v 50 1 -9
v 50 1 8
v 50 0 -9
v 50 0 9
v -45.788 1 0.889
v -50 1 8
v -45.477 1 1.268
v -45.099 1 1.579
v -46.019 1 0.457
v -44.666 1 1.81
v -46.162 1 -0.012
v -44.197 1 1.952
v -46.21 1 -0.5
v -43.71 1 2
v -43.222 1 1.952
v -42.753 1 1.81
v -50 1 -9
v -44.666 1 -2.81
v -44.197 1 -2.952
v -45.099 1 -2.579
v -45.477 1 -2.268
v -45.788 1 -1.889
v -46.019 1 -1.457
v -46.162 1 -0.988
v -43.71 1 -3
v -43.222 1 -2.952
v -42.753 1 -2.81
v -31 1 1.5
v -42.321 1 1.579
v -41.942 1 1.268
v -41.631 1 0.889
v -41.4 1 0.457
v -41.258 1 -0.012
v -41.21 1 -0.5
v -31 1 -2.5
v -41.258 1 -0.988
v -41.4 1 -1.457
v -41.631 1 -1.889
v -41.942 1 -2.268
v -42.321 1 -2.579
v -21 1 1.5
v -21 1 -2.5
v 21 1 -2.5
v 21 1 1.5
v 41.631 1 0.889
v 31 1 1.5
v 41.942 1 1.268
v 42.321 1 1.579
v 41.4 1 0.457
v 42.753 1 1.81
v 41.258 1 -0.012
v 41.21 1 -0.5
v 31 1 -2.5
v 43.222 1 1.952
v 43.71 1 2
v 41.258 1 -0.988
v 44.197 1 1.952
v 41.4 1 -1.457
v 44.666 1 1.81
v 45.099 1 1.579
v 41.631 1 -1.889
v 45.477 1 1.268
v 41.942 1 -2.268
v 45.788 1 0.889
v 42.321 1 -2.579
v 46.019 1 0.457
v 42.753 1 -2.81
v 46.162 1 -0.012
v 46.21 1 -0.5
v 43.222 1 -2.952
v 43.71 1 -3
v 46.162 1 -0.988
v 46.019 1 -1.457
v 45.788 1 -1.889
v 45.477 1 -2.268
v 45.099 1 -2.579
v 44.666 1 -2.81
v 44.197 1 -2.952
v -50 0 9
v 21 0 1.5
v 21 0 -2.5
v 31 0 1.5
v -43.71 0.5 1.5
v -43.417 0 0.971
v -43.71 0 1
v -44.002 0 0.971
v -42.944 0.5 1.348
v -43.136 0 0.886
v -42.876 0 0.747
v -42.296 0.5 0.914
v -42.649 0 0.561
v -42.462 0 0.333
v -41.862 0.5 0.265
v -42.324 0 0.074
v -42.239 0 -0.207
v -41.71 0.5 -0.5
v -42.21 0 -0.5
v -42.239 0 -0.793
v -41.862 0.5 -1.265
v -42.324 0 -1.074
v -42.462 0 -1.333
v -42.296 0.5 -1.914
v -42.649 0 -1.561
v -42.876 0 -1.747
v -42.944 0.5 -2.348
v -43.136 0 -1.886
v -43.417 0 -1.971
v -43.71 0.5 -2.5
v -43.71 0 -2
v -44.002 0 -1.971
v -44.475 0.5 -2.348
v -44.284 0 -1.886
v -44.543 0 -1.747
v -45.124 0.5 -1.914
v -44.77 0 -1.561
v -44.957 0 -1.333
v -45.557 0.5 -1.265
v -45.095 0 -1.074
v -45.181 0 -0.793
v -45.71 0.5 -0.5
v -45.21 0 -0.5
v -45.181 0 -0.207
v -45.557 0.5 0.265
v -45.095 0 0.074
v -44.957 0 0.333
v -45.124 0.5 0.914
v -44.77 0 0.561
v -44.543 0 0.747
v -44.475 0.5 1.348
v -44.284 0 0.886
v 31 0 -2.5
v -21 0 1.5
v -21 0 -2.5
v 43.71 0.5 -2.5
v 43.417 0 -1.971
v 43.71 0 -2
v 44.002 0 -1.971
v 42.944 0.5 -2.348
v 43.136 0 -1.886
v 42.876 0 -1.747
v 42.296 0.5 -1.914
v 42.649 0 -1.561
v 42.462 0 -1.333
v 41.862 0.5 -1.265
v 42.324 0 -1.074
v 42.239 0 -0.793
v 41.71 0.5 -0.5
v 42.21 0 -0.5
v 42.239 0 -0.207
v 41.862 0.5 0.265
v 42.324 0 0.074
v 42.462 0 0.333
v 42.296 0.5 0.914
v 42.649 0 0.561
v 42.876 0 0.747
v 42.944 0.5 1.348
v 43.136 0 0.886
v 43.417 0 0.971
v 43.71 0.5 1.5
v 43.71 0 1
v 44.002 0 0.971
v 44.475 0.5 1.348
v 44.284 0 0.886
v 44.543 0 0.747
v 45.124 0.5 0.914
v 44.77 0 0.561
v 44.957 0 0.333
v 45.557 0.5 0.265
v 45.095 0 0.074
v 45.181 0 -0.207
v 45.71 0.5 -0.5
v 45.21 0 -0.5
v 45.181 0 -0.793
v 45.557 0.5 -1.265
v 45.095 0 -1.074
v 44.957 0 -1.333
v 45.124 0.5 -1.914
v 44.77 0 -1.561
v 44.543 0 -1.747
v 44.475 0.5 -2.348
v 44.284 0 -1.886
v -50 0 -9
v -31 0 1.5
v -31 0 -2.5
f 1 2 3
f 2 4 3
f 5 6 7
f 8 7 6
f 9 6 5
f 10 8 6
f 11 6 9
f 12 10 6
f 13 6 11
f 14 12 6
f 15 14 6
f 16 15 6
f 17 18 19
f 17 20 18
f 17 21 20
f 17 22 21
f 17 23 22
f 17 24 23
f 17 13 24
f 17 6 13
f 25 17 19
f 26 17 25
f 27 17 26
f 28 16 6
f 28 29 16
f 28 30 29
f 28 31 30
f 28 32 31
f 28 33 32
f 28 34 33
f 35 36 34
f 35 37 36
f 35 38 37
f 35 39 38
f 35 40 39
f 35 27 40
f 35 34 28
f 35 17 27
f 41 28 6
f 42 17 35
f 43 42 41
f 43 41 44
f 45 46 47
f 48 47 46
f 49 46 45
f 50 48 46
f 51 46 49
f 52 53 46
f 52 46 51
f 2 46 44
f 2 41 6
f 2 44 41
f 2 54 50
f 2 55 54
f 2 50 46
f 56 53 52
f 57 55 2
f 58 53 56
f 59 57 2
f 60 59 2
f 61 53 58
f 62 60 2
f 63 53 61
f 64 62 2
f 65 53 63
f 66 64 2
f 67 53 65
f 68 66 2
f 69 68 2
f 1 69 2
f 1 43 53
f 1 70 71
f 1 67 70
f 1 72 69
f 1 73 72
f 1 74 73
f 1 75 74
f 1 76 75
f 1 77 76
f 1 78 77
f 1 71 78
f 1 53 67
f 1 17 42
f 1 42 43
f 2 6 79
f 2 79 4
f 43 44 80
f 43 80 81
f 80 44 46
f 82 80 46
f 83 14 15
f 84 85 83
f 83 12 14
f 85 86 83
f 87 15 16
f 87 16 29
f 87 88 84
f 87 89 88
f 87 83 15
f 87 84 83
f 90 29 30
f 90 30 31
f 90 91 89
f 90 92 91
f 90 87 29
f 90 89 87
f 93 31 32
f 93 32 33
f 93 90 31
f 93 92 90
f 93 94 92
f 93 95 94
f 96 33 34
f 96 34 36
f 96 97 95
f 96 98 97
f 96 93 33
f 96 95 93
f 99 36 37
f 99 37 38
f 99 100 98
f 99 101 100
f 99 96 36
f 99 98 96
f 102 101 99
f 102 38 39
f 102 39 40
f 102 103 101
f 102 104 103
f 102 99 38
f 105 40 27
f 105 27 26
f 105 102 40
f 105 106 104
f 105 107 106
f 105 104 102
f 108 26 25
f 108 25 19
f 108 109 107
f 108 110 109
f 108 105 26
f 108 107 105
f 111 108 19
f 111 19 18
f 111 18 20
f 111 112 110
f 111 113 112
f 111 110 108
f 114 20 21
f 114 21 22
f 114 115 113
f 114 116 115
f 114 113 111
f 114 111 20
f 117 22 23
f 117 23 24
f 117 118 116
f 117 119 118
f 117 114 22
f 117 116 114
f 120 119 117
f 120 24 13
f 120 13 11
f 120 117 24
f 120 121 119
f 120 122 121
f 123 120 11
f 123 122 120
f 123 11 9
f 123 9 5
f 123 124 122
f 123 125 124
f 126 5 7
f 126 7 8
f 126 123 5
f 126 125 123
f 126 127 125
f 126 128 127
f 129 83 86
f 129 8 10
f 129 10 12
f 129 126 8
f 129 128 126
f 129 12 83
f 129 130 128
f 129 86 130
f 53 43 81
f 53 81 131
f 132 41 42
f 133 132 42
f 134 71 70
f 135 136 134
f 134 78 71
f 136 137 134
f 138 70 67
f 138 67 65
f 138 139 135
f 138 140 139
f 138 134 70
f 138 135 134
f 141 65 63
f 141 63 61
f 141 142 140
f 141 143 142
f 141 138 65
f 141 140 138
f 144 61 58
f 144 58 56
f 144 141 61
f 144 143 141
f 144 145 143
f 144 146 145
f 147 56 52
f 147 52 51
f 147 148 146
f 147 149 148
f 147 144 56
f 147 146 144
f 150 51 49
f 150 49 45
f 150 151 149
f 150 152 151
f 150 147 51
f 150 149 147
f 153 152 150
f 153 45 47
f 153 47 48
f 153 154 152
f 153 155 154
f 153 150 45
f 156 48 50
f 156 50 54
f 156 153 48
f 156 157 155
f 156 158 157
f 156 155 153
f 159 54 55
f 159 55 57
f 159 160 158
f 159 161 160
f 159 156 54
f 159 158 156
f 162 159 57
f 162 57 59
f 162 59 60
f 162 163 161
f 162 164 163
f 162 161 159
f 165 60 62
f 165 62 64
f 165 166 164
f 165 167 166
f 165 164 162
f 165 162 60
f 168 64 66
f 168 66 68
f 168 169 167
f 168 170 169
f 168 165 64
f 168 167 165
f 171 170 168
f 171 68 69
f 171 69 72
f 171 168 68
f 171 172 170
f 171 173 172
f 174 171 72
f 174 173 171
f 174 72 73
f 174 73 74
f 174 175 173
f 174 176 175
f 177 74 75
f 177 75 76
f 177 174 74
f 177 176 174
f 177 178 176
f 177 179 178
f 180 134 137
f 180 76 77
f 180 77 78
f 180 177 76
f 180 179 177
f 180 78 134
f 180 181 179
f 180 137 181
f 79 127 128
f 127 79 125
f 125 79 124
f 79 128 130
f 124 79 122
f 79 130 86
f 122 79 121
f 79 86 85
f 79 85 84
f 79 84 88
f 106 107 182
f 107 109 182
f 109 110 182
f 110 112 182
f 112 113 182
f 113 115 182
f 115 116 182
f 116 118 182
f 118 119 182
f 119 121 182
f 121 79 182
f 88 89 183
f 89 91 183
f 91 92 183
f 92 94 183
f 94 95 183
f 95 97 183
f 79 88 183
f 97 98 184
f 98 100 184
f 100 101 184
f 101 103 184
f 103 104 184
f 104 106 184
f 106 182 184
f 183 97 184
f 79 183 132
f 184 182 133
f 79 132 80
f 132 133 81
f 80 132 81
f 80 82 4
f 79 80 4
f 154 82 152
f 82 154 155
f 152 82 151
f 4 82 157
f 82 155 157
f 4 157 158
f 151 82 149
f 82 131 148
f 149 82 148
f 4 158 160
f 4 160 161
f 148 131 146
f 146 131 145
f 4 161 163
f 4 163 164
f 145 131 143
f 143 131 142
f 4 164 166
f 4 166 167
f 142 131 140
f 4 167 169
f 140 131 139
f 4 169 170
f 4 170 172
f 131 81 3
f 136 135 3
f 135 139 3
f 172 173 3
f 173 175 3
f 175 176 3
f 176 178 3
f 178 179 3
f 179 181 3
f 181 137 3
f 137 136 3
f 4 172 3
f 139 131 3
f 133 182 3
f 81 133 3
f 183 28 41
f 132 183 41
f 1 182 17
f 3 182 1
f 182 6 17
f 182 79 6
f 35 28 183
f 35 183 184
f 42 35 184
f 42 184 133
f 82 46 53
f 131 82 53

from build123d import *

# Parameters (mm, degrees)
SKETCH_1_W          = 100
SKETCH_1_H          = 18
EXTRUDE_1_DEPTH     = 1
CHAMFER_1_SIZE      = 1
SKETCH_2_W          = 10
SKETCH_2_H          = 4
CUT_EXTRUDE_1_DEPTH = 1
SKETCH_3_R          = 1.5
CUT_EXTRUDE_2_DEPTH = 20
CHAMFER_2_SIZE      = 1


with BuildPart() as part:
    # Эскиз1 → Бобышка-Вытянуть1 (new body)
    with BuildSketch(Plane(origin=(0, 0, 0), x_dir=(1, 0, 0), z_dir=(0, 1, 0))):
        Rectangle(SKETCH_1_W, SKETCH_1_H)
    extrude(amount=EXTRUDE_1_DEPTH)

    # Фаска1
    chamfer_1_edges = [part.edges().sort_by_distance(p)[0] for p in [
        (0, 1, 9),
    ]]
    chamfer(chamfer_1_edges, length=CHAMFER_1_SIZE - 0.0001)  # a hair under: the kernel refuses the full size

    # Эскиз2 → Вырез-Вытянуть1 (cut)
    with BuildSketch(Plane(origin=(0, 1, 0), x_dir=(1, 0, 0), z_dir=(0, 1, 0))):
        with Locations((-26, 0.5)):
            Rectangle(SKETCH_2_W, SKETCH_2_H)
        with Locations((26, 0.5)):
            Rectangle(SKETCH_2_W, SKETCH_2_H)
    extrude(amount=-CUT_EXTRUDE_1_DEPTH, mode=Mode.SUBTRACT)

    # Эскиз3 → Вырез-Вытянуть2 (cut)
    with BuildSketch(Plane(origin=(0, 1, 0), x_dir=(1, 0, 0), z_dir=(0, 1, 0))):
        with Locations(Location((-43.709679881, 0.5, 0), (0, 0, 270))):
            Circle(SKETCH_3_R)
        with Locations(Location((43.709679881, 0.5, 0), (0, 0, 90))):
            Circle(SKETCH_3_R)
    extrude(amount=-CUT_EXTRUDE_2_DEPTH, mode=Mode.SUBTRACT)

    # Фаска2
    chamfer_2_edges = [part.edges().sort_by_distance(p)[0] for p in [
        (-43.709679881, 1, -2),
        (43.709679881, 1, 1),
    ]]
    chamfer(chamfer_2_edges, length=CHAMFER_2_SIZE - 0.0001)  # a hair under: the kernel refuses the full size


solid = part.part
